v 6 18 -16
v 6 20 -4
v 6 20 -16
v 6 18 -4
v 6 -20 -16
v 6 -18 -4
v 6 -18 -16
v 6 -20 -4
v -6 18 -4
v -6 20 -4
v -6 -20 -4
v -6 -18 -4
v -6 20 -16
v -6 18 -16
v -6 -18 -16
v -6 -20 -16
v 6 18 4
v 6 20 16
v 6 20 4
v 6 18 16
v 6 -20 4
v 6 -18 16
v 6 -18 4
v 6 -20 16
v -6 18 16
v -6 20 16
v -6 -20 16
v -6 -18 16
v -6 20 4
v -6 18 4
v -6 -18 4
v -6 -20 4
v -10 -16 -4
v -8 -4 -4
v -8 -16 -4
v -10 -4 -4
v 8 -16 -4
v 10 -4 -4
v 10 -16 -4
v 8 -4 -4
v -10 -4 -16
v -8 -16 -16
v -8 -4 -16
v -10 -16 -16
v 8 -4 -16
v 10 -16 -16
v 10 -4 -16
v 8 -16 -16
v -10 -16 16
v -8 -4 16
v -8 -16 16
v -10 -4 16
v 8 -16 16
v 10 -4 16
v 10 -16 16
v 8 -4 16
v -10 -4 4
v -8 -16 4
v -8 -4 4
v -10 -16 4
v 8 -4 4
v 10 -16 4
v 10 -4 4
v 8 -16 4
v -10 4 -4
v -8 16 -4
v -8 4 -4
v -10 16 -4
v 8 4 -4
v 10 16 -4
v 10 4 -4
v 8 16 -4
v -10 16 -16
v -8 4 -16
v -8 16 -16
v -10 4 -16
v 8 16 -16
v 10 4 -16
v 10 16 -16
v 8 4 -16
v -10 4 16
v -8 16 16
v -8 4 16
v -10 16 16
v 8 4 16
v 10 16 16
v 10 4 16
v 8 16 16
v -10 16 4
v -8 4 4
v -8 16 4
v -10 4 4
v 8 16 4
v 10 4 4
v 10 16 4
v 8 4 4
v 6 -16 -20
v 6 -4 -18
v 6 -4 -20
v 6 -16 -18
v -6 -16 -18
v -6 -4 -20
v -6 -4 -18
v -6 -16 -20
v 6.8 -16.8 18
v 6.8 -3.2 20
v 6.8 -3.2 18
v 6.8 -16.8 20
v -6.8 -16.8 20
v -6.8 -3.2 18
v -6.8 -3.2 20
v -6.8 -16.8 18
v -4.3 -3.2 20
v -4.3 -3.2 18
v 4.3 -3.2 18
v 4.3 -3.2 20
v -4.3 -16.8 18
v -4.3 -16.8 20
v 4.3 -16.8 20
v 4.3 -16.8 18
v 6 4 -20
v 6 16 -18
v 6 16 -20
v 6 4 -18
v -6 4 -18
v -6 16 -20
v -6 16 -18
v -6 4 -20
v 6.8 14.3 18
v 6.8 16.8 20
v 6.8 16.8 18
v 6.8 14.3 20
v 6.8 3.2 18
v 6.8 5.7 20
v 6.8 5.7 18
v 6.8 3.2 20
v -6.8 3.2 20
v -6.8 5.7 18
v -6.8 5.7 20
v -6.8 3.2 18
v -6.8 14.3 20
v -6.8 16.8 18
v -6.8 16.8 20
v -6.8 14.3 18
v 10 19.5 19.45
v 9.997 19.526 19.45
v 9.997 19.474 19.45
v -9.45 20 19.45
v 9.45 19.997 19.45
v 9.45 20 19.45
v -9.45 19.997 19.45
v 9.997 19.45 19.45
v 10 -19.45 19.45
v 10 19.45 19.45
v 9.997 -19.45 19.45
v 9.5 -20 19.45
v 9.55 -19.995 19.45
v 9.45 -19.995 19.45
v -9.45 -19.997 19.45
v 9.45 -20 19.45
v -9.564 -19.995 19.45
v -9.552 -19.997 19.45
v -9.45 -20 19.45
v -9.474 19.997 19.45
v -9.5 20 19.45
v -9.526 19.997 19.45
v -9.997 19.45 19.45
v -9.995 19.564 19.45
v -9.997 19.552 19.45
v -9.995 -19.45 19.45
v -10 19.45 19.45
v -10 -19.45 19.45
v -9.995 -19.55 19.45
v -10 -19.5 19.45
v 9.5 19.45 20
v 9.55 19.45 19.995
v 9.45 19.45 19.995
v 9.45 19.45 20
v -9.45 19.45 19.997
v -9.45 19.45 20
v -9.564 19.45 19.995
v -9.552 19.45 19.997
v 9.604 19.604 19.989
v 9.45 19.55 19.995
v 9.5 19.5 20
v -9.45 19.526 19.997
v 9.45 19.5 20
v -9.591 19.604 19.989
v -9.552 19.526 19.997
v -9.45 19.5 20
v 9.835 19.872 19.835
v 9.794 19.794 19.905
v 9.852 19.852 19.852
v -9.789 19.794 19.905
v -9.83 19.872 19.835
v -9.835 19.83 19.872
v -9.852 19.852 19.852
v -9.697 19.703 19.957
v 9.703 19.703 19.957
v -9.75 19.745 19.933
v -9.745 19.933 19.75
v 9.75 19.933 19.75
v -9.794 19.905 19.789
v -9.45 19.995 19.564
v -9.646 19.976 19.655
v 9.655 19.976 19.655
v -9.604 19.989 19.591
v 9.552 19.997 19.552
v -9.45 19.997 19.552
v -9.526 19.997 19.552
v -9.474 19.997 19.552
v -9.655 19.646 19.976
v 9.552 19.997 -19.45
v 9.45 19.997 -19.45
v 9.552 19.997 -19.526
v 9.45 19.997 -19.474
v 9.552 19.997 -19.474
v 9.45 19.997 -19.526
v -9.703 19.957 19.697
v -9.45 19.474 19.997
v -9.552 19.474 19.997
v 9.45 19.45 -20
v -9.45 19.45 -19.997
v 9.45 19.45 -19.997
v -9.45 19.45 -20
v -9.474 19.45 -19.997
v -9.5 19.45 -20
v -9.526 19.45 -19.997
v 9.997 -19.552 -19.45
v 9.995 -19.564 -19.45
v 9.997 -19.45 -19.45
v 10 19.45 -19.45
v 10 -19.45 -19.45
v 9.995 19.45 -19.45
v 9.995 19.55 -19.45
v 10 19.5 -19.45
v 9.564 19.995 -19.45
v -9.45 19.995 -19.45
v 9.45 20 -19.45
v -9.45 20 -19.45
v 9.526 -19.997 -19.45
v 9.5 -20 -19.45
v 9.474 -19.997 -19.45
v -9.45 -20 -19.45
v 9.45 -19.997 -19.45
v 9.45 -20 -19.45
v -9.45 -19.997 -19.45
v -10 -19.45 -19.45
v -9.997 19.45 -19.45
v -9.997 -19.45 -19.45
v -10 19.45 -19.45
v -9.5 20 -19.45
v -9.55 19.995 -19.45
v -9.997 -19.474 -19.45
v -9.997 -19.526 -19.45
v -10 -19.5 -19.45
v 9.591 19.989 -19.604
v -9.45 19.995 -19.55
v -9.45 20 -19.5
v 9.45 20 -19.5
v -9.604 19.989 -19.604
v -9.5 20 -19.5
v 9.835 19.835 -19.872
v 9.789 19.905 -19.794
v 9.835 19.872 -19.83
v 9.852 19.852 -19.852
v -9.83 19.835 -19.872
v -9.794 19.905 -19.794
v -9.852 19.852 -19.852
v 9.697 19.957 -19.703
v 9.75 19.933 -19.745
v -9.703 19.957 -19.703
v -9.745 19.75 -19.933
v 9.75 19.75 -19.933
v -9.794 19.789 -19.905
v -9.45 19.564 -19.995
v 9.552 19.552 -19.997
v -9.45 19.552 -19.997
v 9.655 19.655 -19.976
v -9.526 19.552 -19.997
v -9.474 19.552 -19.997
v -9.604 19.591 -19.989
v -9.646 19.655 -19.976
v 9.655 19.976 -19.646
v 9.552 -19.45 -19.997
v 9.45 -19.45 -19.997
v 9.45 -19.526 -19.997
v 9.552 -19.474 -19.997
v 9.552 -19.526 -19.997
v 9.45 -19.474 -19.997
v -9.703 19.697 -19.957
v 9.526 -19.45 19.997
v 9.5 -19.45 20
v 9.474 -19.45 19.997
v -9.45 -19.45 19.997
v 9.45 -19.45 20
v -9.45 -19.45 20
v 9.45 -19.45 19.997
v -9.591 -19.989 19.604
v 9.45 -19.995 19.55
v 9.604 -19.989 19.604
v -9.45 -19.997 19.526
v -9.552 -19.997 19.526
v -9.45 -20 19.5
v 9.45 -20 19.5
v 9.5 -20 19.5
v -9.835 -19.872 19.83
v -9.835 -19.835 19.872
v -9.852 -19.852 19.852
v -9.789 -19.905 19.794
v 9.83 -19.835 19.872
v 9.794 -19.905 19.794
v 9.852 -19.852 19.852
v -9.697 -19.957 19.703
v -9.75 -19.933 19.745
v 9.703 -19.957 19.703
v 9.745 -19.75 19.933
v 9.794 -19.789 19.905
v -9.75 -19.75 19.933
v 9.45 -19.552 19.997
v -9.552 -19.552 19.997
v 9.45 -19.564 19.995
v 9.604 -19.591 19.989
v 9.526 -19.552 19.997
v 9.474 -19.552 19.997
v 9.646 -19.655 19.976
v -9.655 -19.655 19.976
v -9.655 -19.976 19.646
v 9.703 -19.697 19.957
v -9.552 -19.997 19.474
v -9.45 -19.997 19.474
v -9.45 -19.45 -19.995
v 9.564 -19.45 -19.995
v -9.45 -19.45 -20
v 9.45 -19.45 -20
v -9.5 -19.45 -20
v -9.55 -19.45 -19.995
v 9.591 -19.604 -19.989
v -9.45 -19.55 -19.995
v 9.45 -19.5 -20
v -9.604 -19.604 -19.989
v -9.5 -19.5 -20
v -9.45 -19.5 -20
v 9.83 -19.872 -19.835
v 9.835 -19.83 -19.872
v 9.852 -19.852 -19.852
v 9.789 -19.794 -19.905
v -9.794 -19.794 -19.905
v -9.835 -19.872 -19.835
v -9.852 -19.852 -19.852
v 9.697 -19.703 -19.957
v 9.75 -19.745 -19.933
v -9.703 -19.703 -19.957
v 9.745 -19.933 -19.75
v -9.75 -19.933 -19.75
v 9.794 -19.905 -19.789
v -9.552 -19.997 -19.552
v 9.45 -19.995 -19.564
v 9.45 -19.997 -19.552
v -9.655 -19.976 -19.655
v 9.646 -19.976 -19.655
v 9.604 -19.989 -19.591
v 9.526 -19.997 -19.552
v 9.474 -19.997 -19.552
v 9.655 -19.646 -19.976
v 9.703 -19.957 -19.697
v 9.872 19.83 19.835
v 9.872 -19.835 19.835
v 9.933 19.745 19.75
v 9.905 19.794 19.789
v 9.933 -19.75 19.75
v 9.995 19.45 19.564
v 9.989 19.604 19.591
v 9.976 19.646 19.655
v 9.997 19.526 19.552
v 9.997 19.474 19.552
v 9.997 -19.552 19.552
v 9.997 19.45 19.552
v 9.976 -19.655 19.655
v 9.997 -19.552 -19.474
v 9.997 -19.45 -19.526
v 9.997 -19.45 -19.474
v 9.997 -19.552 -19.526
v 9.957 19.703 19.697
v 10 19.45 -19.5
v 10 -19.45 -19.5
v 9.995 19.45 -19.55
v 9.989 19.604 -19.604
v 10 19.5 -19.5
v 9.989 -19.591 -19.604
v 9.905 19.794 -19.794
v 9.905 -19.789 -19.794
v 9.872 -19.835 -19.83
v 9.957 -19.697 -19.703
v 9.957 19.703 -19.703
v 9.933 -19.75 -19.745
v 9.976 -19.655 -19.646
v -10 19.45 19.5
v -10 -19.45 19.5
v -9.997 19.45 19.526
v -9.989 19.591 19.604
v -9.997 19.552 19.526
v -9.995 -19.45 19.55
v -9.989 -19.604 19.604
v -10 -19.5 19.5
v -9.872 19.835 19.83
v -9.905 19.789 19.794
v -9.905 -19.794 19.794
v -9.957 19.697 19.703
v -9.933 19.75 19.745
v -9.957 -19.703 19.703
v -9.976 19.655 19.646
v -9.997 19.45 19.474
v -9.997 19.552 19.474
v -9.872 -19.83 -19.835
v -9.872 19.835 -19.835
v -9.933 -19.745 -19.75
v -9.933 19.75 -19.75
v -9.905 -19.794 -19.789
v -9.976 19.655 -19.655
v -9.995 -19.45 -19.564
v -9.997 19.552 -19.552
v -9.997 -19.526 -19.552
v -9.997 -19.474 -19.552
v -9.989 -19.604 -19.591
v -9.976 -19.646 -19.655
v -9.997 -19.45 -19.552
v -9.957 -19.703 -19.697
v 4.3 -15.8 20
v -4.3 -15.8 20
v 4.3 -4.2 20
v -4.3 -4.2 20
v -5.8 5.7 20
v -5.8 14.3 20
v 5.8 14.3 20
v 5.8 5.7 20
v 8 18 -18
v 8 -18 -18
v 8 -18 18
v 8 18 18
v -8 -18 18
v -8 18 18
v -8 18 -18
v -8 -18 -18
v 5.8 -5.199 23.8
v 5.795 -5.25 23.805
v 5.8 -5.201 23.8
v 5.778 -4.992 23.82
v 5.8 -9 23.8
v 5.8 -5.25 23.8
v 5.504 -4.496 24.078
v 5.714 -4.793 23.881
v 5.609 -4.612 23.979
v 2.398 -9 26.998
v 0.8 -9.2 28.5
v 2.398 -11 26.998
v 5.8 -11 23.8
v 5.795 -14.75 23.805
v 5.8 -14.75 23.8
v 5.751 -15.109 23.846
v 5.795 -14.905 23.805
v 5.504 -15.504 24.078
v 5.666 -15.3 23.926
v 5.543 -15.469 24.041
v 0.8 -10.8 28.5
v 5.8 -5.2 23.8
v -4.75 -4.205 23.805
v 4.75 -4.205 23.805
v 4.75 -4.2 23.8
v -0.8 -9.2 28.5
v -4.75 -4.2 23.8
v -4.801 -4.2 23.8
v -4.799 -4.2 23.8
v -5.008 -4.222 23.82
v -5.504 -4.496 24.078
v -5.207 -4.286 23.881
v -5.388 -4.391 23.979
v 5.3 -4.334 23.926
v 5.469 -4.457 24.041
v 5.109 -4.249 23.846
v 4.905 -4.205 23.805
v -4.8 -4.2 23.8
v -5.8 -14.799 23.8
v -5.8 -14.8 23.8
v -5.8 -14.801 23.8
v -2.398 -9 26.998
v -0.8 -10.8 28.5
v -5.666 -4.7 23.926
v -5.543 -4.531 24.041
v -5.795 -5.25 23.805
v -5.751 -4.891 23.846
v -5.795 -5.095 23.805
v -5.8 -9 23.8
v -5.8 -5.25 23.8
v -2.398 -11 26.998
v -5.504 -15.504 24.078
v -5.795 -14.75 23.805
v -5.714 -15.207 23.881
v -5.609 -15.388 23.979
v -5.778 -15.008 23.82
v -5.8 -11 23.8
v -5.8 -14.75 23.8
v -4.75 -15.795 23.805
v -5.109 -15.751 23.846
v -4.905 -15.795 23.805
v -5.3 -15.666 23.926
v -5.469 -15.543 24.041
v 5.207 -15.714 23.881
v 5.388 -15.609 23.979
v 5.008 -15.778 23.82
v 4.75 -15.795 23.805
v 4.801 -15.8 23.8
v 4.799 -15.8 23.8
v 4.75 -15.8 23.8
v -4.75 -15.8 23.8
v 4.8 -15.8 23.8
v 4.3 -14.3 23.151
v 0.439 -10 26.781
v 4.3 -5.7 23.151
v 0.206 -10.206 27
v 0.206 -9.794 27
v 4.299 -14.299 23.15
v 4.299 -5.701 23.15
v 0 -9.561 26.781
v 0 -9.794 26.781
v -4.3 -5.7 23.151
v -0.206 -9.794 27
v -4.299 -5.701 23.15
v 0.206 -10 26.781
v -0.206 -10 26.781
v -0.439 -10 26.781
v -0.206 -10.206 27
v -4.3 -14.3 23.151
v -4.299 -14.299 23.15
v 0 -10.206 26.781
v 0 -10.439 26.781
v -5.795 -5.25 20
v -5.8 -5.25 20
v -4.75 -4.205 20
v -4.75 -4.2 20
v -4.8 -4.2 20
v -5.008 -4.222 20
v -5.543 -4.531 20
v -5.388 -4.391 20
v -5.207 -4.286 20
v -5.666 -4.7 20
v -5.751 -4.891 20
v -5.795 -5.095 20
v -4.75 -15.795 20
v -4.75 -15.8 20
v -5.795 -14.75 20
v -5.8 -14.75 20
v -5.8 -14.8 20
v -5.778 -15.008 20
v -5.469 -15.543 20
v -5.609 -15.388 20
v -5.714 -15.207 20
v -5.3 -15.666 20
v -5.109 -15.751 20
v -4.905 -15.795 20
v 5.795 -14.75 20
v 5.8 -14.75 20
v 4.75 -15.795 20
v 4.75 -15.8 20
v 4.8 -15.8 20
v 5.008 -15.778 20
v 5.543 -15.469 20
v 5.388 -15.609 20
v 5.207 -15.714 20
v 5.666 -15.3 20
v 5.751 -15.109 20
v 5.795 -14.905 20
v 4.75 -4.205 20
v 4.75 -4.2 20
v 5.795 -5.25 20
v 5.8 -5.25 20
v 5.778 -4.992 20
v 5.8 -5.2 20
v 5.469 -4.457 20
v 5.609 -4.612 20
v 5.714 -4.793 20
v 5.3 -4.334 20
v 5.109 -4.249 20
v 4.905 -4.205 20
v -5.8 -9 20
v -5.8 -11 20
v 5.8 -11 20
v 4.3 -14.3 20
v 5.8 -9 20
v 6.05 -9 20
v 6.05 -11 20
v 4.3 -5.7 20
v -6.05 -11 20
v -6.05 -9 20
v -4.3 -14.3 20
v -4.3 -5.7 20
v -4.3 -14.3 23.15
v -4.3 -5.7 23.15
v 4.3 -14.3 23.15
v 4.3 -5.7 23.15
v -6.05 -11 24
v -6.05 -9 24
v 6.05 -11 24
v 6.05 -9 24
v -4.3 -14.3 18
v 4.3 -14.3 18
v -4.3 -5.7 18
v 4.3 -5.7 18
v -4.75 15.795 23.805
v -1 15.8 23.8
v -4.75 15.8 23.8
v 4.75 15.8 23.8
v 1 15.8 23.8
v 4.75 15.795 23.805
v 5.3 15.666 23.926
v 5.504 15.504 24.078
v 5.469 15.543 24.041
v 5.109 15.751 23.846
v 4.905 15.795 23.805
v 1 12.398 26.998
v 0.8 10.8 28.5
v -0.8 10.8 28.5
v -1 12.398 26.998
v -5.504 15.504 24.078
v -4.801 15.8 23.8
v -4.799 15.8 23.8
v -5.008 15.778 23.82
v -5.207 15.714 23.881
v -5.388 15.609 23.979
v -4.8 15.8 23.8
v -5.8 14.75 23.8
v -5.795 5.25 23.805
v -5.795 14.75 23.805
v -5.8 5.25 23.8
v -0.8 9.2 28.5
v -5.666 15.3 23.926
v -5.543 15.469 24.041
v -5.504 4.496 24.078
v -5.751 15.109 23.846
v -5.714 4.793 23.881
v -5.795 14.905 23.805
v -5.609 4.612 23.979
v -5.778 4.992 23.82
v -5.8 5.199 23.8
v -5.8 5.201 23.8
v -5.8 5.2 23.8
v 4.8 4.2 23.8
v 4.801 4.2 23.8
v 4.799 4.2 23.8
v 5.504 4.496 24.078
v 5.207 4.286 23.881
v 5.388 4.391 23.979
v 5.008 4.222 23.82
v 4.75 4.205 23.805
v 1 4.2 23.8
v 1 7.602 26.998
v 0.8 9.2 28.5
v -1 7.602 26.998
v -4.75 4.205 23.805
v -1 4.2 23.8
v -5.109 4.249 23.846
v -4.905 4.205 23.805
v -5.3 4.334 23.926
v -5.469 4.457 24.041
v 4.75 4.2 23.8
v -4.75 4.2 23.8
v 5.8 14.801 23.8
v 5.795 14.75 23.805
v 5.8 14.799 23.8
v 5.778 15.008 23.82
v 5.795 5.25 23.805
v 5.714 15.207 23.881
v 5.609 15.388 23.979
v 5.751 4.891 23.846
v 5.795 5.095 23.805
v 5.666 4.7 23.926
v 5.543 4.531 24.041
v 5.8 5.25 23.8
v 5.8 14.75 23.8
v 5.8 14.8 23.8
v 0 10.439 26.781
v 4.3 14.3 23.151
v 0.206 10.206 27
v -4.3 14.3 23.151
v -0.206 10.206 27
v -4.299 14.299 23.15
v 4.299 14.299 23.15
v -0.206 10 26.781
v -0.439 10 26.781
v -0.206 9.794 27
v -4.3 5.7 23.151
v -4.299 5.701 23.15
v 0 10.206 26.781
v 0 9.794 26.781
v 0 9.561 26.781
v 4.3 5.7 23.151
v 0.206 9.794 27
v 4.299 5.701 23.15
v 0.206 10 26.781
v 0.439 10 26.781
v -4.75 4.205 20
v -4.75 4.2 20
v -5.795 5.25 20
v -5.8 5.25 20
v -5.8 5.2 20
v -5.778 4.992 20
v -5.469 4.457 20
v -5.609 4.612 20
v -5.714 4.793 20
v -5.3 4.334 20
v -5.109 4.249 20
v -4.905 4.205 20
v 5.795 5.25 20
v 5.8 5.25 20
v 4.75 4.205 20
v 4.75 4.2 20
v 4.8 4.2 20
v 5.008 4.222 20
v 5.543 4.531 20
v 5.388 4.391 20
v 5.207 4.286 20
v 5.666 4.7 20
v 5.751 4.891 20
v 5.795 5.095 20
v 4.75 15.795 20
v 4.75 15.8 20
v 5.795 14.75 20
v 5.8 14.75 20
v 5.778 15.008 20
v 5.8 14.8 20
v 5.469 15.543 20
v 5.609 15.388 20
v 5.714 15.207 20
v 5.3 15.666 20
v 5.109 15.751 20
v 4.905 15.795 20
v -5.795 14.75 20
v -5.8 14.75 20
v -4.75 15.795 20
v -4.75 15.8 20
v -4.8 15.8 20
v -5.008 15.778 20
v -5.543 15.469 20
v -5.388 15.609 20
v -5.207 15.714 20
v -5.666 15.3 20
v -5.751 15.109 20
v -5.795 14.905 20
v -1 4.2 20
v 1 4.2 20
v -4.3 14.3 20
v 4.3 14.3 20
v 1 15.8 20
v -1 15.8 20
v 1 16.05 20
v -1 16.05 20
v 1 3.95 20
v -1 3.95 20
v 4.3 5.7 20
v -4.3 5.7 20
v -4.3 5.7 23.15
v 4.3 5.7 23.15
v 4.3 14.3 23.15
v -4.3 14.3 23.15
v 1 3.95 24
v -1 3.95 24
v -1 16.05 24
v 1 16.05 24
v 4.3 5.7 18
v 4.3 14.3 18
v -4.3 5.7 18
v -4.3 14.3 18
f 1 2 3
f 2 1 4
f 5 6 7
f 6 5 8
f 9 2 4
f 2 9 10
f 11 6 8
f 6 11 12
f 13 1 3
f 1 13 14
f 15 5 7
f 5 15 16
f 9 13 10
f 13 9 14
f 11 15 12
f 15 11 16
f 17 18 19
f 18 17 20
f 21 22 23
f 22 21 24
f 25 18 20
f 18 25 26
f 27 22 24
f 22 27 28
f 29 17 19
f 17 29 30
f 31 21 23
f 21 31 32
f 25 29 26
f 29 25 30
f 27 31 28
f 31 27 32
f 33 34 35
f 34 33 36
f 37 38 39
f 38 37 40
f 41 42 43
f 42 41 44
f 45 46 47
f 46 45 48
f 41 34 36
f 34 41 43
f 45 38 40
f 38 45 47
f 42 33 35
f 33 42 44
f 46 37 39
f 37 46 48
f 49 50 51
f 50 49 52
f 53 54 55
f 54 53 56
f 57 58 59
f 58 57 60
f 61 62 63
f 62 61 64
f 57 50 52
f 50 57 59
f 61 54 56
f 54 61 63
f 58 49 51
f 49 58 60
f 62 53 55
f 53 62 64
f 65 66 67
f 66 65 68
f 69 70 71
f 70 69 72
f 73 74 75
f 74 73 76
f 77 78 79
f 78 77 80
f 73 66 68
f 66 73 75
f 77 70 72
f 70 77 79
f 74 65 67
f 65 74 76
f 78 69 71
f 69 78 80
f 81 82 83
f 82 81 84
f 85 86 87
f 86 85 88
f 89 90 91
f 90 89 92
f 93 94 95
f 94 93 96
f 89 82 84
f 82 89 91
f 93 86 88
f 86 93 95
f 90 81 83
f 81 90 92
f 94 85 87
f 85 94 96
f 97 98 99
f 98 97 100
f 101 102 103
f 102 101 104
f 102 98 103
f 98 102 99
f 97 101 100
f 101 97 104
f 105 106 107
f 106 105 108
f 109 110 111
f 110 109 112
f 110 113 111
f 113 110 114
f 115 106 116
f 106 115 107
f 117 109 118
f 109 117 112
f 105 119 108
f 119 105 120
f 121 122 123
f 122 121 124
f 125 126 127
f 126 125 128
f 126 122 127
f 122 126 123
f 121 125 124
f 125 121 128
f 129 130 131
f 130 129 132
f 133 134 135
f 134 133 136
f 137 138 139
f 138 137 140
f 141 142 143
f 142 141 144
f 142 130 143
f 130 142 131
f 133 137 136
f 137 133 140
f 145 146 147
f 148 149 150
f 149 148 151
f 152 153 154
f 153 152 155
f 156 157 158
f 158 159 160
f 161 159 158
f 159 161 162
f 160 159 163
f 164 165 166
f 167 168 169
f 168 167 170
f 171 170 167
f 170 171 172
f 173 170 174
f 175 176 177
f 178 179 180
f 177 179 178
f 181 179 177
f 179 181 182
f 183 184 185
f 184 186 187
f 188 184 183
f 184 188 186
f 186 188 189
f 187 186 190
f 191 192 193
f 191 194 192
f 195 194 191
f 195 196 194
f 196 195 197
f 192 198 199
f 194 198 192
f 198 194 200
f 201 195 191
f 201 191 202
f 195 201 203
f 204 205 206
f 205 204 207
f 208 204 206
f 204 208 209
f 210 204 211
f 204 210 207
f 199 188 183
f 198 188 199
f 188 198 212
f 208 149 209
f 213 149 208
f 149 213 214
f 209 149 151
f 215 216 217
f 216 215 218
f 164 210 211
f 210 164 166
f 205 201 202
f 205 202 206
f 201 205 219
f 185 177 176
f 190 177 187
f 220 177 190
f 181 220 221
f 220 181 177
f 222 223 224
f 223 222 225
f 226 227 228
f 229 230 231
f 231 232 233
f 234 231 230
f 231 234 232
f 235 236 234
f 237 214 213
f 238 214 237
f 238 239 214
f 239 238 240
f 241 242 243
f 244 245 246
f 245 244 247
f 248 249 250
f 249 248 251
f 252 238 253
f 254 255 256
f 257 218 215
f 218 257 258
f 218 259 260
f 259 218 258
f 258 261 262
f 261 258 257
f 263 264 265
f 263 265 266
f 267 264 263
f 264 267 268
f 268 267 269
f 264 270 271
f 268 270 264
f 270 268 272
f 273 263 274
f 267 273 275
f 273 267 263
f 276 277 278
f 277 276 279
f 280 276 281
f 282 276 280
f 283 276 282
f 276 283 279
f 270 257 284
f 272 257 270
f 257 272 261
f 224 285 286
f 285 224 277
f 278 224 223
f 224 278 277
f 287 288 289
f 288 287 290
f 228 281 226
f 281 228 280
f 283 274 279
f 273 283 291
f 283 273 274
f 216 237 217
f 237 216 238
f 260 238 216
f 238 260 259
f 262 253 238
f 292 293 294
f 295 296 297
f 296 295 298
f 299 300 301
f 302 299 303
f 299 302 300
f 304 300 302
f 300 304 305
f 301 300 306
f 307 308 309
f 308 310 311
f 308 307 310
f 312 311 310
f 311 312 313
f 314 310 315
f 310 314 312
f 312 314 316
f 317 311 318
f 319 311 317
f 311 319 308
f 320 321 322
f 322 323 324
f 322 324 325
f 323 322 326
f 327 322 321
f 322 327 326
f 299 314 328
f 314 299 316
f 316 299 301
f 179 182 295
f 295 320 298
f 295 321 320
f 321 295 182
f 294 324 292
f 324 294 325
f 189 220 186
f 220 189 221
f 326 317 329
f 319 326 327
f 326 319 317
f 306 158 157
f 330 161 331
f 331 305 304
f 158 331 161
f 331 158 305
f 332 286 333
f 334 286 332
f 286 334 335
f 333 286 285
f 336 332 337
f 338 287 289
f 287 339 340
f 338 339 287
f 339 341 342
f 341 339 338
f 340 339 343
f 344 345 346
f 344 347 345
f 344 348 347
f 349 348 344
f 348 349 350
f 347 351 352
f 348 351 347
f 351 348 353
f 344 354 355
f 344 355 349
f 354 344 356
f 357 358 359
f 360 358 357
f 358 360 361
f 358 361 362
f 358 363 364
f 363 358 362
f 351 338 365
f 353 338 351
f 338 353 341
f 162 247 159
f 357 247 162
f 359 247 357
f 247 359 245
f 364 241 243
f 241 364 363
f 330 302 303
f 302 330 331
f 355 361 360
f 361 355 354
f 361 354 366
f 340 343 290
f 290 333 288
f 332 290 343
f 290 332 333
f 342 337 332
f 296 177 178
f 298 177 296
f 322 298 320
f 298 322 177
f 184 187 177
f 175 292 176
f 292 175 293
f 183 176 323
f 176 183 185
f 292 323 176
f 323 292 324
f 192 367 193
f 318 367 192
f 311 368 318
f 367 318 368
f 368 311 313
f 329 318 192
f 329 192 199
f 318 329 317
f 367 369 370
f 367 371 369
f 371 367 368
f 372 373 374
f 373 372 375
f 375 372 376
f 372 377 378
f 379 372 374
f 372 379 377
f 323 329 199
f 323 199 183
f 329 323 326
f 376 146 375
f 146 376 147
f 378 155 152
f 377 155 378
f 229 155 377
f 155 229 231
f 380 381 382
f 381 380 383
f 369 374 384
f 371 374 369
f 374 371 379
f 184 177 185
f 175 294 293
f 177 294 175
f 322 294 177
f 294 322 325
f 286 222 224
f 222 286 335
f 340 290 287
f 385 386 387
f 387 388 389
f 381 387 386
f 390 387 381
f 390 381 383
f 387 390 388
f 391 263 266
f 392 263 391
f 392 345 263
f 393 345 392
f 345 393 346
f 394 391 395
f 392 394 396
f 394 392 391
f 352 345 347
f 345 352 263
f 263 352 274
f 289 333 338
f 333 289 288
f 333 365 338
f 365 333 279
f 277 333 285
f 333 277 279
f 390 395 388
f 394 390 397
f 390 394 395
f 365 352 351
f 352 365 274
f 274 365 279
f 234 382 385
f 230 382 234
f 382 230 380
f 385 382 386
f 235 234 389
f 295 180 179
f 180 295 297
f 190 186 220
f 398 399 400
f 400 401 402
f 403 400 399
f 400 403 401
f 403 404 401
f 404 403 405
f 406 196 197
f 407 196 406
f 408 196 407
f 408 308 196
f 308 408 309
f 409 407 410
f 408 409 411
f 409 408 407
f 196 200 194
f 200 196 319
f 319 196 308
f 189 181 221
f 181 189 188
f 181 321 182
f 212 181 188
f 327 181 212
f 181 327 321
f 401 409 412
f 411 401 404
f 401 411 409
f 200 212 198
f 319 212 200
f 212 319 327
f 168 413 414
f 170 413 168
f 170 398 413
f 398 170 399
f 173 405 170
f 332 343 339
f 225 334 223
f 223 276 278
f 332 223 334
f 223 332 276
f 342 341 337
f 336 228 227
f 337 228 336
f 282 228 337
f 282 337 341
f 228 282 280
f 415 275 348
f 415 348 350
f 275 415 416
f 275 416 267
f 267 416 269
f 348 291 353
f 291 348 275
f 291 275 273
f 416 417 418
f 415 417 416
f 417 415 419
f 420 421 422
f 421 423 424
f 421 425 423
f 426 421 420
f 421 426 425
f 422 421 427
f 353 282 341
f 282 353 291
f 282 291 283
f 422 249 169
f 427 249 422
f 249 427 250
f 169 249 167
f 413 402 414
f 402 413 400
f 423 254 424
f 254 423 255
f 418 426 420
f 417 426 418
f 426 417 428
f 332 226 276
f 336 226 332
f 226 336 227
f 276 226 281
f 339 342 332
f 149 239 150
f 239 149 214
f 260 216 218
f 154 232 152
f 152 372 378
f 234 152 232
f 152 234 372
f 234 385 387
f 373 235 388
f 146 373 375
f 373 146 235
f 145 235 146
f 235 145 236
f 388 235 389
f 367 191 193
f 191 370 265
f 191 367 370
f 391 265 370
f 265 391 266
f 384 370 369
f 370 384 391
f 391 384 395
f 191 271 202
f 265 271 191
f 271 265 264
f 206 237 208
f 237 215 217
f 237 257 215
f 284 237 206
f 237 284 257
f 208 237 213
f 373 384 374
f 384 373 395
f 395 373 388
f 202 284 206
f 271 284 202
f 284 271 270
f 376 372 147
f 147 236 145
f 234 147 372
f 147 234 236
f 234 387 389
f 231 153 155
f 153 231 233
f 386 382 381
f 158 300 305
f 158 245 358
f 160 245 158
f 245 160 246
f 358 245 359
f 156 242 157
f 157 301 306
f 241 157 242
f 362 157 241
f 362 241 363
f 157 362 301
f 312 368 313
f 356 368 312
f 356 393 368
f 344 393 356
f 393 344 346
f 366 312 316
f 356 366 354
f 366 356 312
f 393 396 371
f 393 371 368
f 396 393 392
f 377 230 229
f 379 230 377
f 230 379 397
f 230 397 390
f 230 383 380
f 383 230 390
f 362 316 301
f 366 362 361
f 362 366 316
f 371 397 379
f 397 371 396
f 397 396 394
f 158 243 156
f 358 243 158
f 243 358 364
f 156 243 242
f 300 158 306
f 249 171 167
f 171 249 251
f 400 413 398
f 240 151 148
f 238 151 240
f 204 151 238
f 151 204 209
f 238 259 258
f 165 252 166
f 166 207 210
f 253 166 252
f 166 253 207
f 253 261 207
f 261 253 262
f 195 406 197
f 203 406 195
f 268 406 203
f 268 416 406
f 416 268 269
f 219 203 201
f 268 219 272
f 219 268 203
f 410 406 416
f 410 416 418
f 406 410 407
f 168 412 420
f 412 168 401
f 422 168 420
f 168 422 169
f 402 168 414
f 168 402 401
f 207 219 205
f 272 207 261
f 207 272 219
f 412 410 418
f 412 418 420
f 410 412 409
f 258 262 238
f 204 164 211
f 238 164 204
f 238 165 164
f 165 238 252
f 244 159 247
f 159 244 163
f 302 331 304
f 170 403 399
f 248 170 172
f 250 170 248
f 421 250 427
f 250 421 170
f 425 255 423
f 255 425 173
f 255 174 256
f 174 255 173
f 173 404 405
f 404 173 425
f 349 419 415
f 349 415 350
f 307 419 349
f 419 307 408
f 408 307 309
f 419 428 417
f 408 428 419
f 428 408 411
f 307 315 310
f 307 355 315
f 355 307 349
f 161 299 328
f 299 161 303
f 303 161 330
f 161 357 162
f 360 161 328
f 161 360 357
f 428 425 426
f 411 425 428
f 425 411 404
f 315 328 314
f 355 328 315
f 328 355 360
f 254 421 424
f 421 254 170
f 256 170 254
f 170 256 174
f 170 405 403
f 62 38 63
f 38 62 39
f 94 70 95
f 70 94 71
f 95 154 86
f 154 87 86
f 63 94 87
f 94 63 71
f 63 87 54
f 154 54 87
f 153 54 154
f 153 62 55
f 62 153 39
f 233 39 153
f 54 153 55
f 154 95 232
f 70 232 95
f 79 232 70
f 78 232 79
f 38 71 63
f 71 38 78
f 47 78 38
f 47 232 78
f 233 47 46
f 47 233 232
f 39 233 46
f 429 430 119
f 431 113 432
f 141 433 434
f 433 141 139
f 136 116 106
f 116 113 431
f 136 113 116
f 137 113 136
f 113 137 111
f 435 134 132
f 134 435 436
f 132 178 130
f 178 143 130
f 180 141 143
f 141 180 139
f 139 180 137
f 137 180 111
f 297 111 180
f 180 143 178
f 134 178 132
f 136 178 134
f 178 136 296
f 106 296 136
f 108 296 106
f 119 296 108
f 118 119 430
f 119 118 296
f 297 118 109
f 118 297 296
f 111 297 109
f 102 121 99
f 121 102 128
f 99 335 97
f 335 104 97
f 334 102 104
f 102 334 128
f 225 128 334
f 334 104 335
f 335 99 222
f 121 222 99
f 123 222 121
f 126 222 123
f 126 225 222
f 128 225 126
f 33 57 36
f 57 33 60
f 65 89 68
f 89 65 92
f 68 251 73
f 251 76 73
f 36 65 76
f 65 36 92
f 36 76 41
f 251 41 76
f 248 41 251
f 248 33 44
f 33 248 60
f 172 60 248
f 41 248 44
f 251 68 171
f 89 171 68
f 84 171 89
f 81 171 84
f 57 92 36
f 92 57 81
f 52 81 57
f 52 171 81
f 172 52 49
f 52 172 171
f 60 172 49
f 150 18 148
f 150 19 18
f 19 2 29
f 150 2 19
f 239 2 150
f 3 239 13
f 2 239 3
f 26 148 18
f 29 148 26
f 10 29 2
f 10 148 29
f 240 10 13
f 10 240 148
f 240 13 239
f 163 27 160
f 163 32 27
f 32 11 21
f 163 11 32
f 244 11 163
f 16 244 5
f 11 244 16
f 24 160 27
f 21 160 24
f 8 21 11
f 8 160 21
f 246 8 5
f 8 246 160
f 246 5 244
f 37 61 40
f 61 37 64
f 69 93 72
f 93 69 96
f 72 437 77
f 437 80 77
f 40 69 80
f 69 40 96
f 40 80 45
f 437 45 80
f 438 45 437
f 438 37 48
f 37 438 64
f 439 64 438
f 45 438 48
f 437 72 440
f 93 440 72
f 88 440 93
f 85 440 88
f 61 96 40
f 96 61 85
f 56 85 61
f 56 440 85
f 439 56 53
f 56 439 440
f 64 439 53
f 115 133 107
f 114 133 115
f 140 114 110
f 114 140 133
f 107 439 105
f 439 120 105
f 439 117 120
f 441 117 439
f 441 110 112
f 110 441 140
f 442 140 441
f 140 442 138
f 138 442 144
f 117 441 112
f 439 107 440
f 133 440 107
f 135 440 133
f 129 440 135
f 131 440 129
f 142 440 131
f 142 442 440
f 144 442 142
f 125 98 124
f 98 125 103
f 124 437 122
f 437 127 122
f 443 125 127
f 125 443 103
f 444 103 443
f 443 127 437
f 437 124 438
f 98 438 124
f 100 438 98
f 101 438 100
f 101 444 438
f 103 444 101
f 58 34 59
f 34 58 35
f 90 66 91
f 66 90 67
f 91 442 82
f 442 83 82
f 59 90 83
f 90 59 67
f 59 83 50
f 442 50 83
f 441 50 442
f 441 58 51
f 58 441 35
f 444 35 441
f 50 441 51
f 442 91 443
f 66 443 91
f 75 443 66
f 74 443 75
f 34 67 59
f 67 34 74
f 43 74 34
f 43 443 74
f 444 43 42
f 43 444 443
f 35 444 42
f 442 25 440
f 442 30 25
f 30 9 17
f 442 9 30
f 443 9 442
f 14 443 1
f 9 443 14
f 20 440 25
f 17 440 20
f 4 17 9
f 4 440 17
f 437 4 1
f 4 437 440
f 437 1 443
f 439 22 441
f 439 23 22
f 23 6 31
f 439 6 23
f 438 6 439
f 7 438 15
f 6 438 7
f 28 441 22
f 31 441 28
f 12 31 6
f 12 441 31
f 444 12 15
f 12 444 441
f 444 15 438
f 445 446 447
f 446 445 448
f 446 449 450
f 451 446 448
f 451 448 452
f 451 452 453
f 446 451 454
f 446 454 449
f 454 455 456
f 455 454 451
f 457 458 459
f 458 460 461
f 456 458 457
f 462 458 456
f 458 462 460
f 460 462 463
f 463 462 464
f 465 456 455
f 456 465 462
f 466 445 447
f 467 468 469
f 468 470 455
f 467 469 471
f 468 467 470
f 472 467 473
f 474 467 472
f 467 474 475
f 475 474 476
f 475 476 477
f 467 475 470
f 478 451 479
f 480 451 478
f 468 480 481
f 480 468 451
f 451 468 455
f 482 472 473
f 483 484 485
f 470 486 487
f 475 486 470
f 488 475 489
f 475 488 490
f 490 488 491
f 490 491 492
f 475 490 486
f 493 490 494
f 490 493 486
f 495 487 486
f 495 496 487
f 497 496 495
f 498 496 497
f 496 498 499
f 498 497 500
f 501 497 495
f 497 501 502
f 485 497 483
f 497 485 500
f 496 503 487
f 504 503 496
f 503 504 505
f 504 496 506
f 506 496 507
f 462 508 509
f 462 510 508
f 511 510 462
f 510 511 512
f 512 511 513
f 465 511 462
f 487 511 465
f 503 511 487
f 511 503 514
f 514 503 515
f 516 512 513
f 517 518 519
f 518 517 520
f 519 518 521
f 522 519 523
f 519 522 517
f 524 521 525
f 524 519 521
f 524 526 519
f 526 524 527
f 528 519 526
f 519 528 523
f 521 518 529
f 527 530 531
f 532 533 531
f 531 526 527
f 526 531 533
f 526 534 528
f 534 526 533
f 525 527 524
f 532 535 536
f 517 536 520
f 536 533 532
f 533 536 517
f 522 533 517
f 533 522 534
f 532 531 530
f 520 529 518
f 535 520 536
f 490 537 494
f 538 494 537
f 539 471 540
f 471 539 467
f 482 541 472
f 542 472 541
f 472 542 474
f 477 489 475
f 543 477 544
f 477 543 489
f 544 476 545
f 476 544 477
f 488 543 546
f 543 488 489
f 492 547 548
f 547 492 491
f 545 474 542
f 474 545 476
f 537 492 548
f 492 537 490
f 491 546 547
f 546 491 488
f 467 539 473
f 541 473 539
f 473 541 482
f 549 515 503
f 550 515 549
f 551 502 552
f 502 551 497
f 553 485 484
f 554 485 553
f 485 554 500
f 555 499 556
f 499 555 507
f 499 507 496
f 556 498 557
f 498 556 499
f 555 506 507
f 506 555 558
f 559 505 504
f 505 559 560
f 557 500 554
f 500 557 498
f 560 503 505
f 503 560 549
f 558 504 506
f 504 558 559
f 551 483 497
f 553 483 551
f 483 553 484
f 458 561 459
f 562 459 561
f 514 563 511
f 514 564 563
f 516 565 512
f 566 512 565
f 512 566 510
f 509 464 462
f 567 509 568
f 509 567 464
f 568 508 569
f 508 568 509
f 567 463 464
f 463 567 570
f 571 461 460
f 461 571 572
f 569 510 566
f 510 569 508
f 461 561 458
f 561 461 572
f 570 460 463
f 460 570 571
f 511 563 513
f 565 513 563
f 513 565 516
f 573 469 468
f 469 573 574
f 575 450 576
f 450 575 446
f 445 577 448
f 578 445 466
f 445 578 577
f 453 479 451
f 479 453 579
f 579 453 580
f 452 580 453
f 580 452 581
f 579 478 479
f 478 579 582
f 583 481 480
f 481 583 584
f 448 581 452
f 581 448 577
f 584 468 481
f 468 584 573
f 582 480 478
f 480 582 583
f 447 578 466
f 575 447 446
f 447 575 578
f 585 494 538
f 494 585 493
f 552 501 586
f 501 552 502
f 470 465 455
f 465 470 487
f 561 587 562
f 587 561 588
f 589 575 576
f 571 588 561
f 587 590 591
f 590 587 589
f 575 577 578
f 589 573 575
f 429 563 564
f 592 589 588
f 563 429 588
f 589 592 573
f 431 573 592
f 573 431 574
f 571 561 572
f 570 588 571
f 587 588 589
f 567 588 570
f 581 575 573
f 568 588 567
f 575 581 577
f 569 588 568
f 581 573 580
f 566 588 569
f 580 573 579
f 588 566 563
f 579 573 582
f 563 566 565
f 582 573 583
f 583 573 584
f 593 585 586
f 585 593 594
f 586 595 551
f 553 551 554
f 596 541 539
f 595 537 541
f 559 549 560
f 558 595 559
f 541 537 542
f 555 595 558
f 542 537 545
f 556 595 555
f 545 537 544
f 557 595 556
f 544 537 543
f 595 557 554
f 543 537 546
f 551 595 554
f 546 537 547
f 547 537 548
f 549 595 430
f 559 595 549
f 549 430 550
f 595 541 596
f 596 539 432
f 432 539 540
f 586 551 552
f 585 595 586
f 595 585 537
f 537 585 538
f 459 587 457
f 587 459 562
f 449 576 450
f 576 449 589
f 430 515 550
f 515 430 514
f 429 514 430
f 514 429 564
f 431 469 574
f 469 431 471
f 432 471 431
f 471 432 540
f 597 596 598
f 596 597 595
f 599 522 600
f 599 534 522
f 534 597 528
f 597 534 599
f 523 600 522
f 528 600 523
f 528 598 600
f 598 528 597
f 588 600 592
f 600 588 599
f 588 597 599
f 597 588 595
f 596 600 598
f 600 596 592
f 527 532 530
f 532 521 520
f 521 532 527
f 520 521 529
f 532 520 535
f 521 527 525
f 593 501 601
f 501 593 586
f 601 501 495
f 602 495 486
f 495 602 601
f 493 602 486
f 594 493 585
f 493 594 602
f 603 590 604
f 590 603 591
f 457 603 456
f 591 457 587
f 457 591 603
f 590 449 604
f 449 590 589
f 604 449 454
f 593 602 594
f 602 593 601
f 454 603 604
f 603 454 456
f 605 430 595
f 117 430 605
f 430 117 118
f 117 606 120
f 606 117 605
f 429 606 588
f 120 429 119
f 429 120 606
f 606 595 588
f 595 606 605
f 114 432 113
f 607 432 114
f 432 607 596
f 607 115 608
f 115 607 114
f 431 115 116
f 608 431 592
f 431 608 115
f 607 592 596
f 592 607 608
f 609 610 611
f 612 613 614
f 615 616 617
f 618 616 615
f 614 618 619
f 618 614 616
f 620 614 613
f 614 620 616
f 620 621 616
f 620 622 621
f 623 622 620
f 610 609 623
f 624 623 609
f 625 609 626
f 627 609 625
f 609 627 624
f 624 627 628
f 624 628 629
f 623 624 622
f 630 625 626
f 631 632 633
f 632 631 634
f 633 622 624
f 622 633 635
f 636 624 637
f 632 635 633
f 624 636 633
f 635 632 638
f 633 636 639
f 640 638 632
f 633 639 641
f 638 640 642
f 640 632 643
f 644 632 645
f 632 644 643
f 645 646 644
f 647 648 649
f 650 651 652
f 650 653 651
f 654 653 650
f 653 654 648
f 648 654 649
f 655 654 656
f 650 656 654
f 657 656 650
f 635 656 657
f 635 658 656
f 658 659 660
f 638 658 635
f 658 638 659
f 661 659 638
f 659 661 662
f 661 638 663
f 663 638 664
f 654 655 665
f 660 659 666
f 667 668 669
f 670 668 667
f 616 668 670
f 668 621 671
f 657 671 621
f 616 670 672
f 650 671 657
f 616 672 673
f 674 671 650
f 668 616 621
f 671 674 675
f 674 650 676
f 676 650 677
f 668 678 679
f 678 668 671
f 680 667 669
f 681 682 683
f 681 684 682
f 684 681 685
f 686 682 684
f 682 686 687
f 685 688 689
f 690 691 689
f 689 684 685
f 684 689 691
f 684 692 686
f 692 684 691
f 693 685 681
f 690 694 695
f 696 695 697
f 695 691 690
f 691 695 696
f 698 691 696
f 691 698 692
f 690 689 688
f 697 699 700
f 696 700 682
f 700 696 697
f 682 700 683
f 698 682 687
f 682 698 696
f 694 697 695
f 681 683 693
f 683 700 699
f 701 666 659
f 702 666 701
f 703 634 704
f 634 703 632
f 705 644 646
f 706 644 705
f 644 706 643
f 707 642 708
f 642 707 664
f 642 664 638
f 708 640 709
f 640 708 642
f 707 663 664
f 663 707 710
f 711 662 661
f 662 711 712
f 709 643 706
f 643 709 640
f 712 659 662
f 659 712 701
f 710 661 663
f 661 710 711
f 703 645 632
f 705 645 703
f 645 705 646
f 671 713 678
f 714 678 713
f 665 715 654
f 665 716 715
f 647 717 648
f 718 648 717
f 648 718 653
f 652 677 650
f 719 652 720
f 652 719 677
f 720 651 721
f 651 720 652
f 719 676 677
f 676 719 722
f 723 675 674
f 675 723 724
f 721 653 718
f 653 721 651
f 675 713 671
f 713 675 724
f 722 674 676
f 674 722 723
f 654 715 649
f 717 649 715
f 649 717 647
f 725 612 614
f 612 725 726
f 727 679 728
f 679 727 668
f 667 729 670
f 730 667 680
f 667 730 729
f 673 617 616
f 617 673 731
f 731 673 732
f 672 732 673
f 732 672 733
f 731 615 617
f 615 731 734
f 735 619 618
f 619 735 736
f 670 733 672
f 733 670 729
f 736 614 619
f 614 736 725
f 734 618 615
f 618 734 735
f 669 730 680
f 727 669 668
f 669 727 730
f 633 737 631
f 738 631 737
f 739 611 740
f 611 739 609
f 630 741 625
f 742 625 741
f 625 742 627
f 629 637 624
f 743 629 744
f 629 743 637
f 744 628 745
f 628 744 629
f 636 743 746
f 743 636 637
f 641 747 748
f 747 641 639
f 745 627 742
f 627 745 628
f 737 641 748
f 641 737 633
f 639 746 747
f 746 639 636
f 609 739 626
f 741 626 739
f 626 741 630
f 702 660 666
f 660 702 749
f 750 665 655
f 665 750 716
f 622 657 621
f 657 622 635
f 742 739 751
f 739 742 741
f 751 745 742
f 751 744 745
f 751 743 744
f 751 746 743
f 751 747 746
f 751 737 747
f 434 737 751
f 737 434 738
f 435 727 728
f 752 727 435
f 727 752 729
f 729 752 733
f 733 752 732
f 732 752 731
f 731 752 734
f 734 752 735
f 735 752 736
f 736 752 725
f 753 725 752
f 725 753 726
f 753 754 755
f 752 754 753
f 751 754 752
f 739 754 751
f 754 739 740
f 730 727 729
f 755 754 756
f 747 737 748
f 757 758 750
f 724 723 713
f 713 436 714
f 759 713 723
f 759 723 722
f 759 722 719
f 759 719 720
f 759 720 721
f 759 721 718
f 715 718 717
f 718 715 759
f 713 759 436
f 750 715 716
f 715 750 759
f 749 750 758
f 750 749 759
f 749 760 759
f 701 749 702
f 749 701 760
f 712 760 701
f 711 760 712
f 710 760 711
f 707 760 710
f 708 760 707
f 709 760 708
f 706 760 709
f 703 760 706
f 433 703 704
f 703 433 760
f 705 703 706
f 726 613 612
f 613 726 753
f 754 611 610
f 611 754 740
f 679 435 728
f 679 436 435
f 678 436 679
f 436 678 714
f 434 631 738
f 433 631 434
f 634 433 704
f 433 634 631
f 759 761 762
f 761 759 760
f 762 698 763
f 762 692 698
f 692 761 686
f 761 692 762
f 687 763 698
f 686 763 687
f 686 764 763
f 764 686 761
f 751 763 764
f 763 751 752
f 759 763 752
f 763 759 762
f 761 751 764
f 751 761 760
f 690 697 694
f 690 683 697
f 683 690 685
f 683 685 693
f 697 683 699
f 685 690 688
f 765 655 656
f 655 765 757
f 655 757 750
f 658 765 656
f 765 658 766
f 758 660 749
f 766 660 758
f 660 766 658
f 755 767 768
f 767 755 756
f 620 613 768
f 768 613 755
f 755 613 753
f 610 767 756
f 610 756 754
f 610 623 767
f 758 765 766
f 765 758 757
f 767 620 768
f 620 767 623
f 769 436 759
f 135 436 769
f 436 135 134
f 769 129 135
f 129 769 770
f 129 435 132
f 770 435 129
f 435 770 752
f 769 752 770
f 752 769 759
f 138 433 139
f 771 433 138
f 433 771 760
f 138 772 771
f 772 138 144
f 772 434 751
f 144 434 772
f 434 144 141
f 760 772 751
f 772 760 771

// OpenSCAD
length = 1; //[1:10]

width = 2; //[1:10]

height = 2; //[1:10]

/* [Advanced] */

// for single material printing
supports = 0; // [0:No Supports,1:Supports]

// 0.2 suggested for printing on MakerBot Replicator 2 with 0.2mm layer height
support_thickness = 0.2;

// increase if snap fits are too tight, decrease if snap fits are too loose. 0.0 suggested for MakerBot Replicator 2, 0.0 suggested for Shapeways
male_snap_fit_tolerance = 0;

// increase if snap fits are too tight, decrease if snap fits are too loose. 0.2 suggested for MakerBot Replicator 2, 0.0 suggested for Shapeways
female_snap_fit_tolerance = 0;

/* [Hidden] */

/*These designs are owned by Rokenbok Education and published under license by kid*spark, a nonprofit corporation, for nonprofit and educational uses. Drawings of these designs are licensed under Creative Commons Attribution-NonCommercial-ShareAlike (BY-NC-SA) 3.0: http://creativecommons.org/licenses/by-nc-sa/3.0/ The drawings may be freely downloaded, modified, and used, providing that attribution is given to Rokenbok Education and the drawings are for non-commercial purposes. Any modified drawings are licensed under the same terms. The drawings are intended for educational and hobby uses only; 3D prints of these designs should not be considered toys or for use by children without adult supervision. The drawings are not guaranteed to print perfectly.*/

BLOCK_LENGTH = 20;
WINDOW = 12+female_snap_fit_tolerance;
TOP_WINDOW = 13.6;
WALL = 2;
PYRAMID_LENGTH = 11.6;
PYRAMID_HEIGHT = 8.5;
p1 = sqrt(pow(4.7,2)+pow(5,2));

module filletX(rad = 0.5, length = 20, pos = [0,-10,10], rot = [0,0,0]) {
	translate([pos[0],pos[1]-sign(pos[1])*rad/2,pos[2]-sign(pos[2])*rad/2])
		rotate(rot)
			rotate([0,0,90])
				difference() {
					cube([rad+.1,length+1,rad+.1], center = true);
			
					translate([rad/2,0,-rad/2])
						rotate([90,0,0])
							cylinder(r = rad, h = length+2, $fs = 0.1, center = true);
				} // end difference fillet
} // end module filletX()

module filletY(rad = 0.5, length = 20, pos = [-10,0,10], rot = [0,0,0]) {
	translate([pos[0]-sign(pos[0])*rad/2,0,pos[2]-sign(pos[2])*rad/2])
		rotate(rot)
			difference() {
				cube([rad+.1,length+1,rad+.1], center = true);
		
				translate([rad/2,0,-rad/2])
					rotate([90,0,0])
						cylinder(r = rad, h = length+2, $fs = 0.1, center = true);
			} // end difference fillet
} // end module filletY()

module filletZ(rad = 0.5, length = 20, pos = [10,-10,0], rot = [0,0,90]) {
	translate([pos[0]-sign(pos[0])*rad/2,pos[1]-sign(pos[1])*rad/2],0)
		rotate(rot)
			rotate([90,0,0])
				difference() {
					cube([rad+.1,length+1,rad+.1], center = true);
			
					translate([rad/2,0,-rad/2])
						rotate([90,0,0])
							cylinder(r = rad, h = length+2, $fs = 0.1, center = true);
				} // end difference fillet
} // end module filletZ()

module pyramid(origin = [0,0,0], orientation = [0,0,0]) { // generate pyramid
	translate([origin[0],origin[1],origin[2]+PYRAMID_HEIGHT/2])
		rotate(orientation) {
				difference() {
					union() {
						cube(size = [PYRAMID_LENGTH,PYRAMID_LENGTH,PYRAMID_HEIGHT], center = true);
						
					} // end union
		
					for (i = [0:90:270]) {
						rotate([0,0,i])
							translate([-5.65,0,8.65-PYRAMID_HEIGHT/2]) rotate([0,-43.23,0])
								cube(size = [p1,PYRAMID_LENGTH+1,p1], center = true);
					} // end for
					translate([0,0,3.15/2-PYRAMID_HEIGHT/2-.1])
						cube([PYRAMID_LENGTH-3,PYRAMID_LENGTH-3,3.15+.2], center = true);
					for (j = [0:90:270]) {
						rotate([0,0,j])
							intersection_for (i = [0:90:90]) {
								rotate([0,0,i])
									translate([-0.328506,0,3.028506-PYRAMID_HEIGHT/2]) rotate([0,-43.23,0])
										cube(size = [5.619227,PYRAMID_LENGTH-3,5.619227], center = true);
							} // end intersection_for
					} // end for
					translate([0,0,PYRAMID_HEIGHT/2-1.5-0.411352/2])
						cube(size = 0.411352, center = true);
					for (i = [0:90:270]) {
						rotate([0,0,i]) {
							filletZ(rad = 1, length = 10, pos = [PYRAMID_LENGTH/2,-PYRAMID_LENGTH/2,0]);
							//#filletX(rad = 1, length = PYRAMID_LENGTH, pos = [0,-PYRAMID_LENGTH/2,0]); // doesn't work with non-90 degree corner
						} // end rotate
					} // end for
				} // end difference
			translate([PYRAMID_LENGTH/2,0,2-PYRAMID_HEIGHT/2])
				cube([0.5-male_snap_fit_tolerance,2,4], center = true);
			translate([-4.064241,0,5.306774-PYRAMID_HEIGHT/2])
				rotate([0,-39.38,0])
					cube([4.727957,2,0.5-male_snap_fit_tolerance], center = true);
			mirror([1,0,0]) {
				translate([-4.064241,0,5.306774-PYRAMID_HEIGHT/2])
					rotate([0,-39.38,0])
						cube([4.727957,2,0.5-male_snap_fit_tolerance], center = true);
				translate([PYRAMID_LENGTH/2,0,2-PYRAMID_HEIGHT/2])
					cube([0.5-male_snap_fit_tolerance,2,4], center = true);
			} // end mirror
			translate([0,PYRAMID_LENGTH/2+(TOP_WINDOW-PYRAMID_LENGTH)/4-1.5/2,-(PYRAMID_HEIGHT+WALL)/2]) 
				cube([PYRAMID_LENGTH-3,(TOP_WINDOW-PYRAMID_LENGTH)/2+1.5,WALL], center = true);
			mirror([0,1,0])
				translate([0,PYRAMID_LENGTH/2+(TOP_WINDOW-PYRAMID_LENGTH)/4-1.5/2,-(PYRAMID_HEIGHT+WALL)/2]) 
					cube([PYRAMID_LENGTH-3,(TOP_WINDOW-PYRAMID_LENGTH)/2+1.5,WALL], center = true);
		
			if (supports == 1) {
				difference() {
					union() {

						translate([0,TOP_WINDOW/2+support_thickness/2,-(height*BLOCK_LENGTH+PYRAMID_HEIGHT)/2])
							cube([TOP_WINDOW,support_thickness,height*BLOCK_LENGTH-WALL], center = true);
						translate([TOP_WINDOW/2+support_thickness/2,0,-(height*BLOCK_LENGTH+PYRAMID_HEIGHT)/2])
							cube([support_thickness,TOP_WINDOW,height*BLOCK_LENGTH-WALL], center = true);
	
						mirror([0,1,0]) {
							translate([0,TOP_WINDOW/2+support_thickness/2,-(height*BLOCK_LENGTH+PYRAMID_HEIGHT)/2])
								cube([TOP_WINDOW,support_thickness,height*BLOCK_LENGTH-WALL], center = true);
						} // end mirror
						mirror([1,0,0]) {
							translate([TOP_WINDOW/2+support_thickness/2,0,-(height*BLOCK_LENGTH+PYRAMID_HEIGHT)/2])
								cube([support_thickness,TOP_WINDOW,height*BLOCK_LENGTH-WALL], center = true);
						} // end mirror
					} // end union

					translate([0,0,-(PYRAMID_HEIGHT+height*BLOCK_LENGTH)/2]) {
						cube([length*BLOCK_LENGTH,4,height*BLOCK_LENGTH], center = true);
						cube([4,width*BLOCK_LENGTH,height*BLOCK_LENGTH], center = true);
					} // end translate
				} // end difference

				// new April 30 2014
				translate([0,(PYRAMID_LENGTH-3+support_thickness)/2,-(height*BLOCK_LENGTH+PYRAMID_HEIGHT+WALL)/2])
					cube([PYRAMID_LENGTH-3,support_thickness,height*BLOCK_LENGTH-WALL], center = true);
				mirror([0,1,0])
					translate([0,(PYRAMID_LENGTH-3+support_thickness)/2,-(height*BLOCK_LENGTH+PYRAMID_HEIGHT+WALL)/2])
						cube([PYRAMID_LENGTH-3,support_thickness,height*BLOCK_LENGTH-WALL], center = true);
				// floor
				translate([0,0,-((2*height)*BLOCK_LENGTH+PYRAMID_HEIGHT)/2+0.6/2])
					cube([PYRAMID_LENGTH-3,PYRAMID_LENGTH-3,0.6], center = true);
			} // end if supports == 1

		} // end rotate
} // end module pyramid

difference() {
	cube([length*BLOCK_LENGTH,width*BLOCK_LENGTH,height*BLOCK_LENGTH], center = true);

	cube([length*BLOCK_LENGTH-2*WALL,width*BLOCK_LENGTH-2*WALL,height*BLOCK_LENGTH-2*WALL], center = true);

	for (i = [1:length]) {
		for (j = [1:height]) {
			translate([(-(length+1)/2)*BLOCK_LENGTH+i*BLOCK_LENGTH,0,(-(height+1)/2)*BLOCK_LENGTH+j*BLOCK_LENGTH])
				cube([WINDOW,width*BLOCK_LENGTH+1,WINDOW], center = true);
		} // end for j = 1:height
	} // end for i = 1:length

	for (i = [1:width]) {
		for (j = [1:height]) {
			translate([0,(-(width+1))/2*BLOCK_LENGTH+i*BLOCK_LENGTH,(-(height+1))/2*BLOCK_LENGTH+j*BLOCK_LENGTH])
				cube([length*BLOCK_LENGTH+1,WINDOW,WINDOW], center = true);
		} // end for j = 1:height
	} // end for i = 1:width

	for (i = [1:length]) {
		for (j = [1:width]) {
			translate([(-(length+1))/2*BLOCK_LENGTH+i*BLOCK_LENGTH,(-(width+1))/2*BLOCK_LENGTH+j*BLOCK_LENGTH,0]) {
				translate([0,0,-(height*BLOCK_LENGTH-WALL)/2])
					cube([WINDOW,WINDOW,WALL+1], center = true);
				translate([0,0,(height*BLOCK_LENGTH-WALL)/2])
					cube([TOP_WINDOW,TOP_WINDOW,WALL+1], center = true);
			} // end translate
		} // end for j = 1:width
	} // end for i = 1:length
	
	// edge fillets 0.5mm radius
	filletX(rad = 0.5, length = length*BLOCK_LENGTH, pos = [0,width*BLOCK_LENGTH/2,height*BLOCK_LENGTH/2], rot = [-90,0,0]);
	filletX(rad = 0.5, length = length*BLOCK_LENGTH, pos = [0,width*BLOCK_LENGTH/2,-height*BLOCK_LENGTH/2], rot = [180,0,0]);
	filletX(rad = 0.5, length = length*BLOCK_LENGTH, pos = [0,-width*BLOCK_LENGTH/2,height*BLOCK_LENGTH/2], rot = [0,0,0]);
	filletX(rad = 0.5, length = length*BLOCK_LENGTH, pos = [0,-width*BLOCK_LENGTH/2,-height*BLOCK_LENGTH/2], rot = [90,0,0]);

	filletY(rad = 0.5, length = width*BLOCK_LENGTH, pos = [length*BLOCK_LENGTH/2,0,height*BLOCK_LENGTH/2], rot = [0,90,0]);
	filletY(rad = 0.5, length = width*BLOCK_LENGTH, pos = [length*BLOCK_LENGTH/2,0,-height*BLOCK_LENGTH/2], rot = [0,180,0]);
	filletY(rad = 0.5, length = width*BLOCK_LENGTH, pos = [-length*BLOCK_LENGTH/2,0,height*BLOCK_LENGTH/2], rot = [0,0,0]);
	filletY(rad = 0.5, length = width*BLOCK_LENGTH, pos = [-length*BLOCK_LENGTH/2,0,-height*BLOCK_LENGTH/2], rot = [0,-90,0]);

	filletZ(rad = 0.5, length = height*BLOCK_LENGTH, pos = [length*BLOCK_LENGTH/2,width*BLOCK_LENGTH/2,0], rot = [0,0,180]);
	filletZ(rad = 0.5, length = height*BLOCK_LENGTH, pos = [length*BLOCK_LENGTH/2,-width*BLOCK_LENGTH/2,0], rot = [0,0,90]);
	filletZ(rad = 0.5, length = height*BLOCK_LENGTH, pos = [-length*BLOCK_LENGTH/2,width*BLOCK_LENGTH/2,0], rot = [0,0,-90]);
	filletZ(rad = 0.5, length = height*BLOCK_LENGTH, pos = [-length*BLOCK_LENGTH/2,-width*BLOCK_LENGTH/2,0], rot = [0,0,0]);//*/

} // end difference

for (i = [1:length]) {
	for (j = [1:width]) {
			pyramid(origin = [(-(length+1)/2)*BLOCK_LENGTH+i*BLOCK_LENGTH,(-(width+1))/2*BLOCK_LENGTH+j*BLOCK_LENGTH,height/2*BLOCK_LENGTH], orientation = [0,0,(i+j)*90]);
	} // end for j = 1:width
} // end for i = 1:length */

if (supports == 1) {
	for (i = [1:length]) {
		for (j = [1:height]) {
			translate([(-(length+1)/2)*BLOCK_LENGTH+i*BLOCK_LENGTH,width*BLOCK_LENGTH/2-support_thickness/2-WALL/2,(-(height+1)/2)*BLOCK_LENGTH+j*BLOCK_LENGTH])
				cube([WINDOW/3,support_thickness,WINDOW], center = true);
			translate([(-(length+1)/2)*BLOCK_LENGTH+i*BLOCK_LENGTH,-(width*BLOCK_LENGTH/2-support_thickness/2-WALL/2),(-(height+1)/2)*BLOCK_LENGTH+j*BLOCK_LENGTH])
				cube([WINDOW/3,support_thickness,WINDOW], center = true);

		} // end for j = 1:height
	} // end for i = 1:length

	for (i = [1:width]) {
		for (j = [1:height]) {
			translate([length*BLOCK_LENGTH/2-support_thickness/2-WALL/2,(-(width+1))/2*BLOCK_LENGTH+i*BLOCK_LENGTH,(-(height+1))/2*BLOCK_LENGTH+j*BLOCK_LENGTH])
				cube([support_thickness,WINDOW/3,WINDOW], center = true);
			translate([-(length*BLOCK_LENGTH/2-support_thickness/2-WALL/2),(-(width+1))/2*BLOCK_LENGTH+i*BLOCK_LENGTH,(-(height+1))/2*BLOCK_LENGTH+j*BLOCK_LENGTH])
				cube([support_thickness,WINDOW/3,WINDOW], center = true);

		} // end for j = 1:height
	} // end for i = 1:width
} // end if supports == 1
